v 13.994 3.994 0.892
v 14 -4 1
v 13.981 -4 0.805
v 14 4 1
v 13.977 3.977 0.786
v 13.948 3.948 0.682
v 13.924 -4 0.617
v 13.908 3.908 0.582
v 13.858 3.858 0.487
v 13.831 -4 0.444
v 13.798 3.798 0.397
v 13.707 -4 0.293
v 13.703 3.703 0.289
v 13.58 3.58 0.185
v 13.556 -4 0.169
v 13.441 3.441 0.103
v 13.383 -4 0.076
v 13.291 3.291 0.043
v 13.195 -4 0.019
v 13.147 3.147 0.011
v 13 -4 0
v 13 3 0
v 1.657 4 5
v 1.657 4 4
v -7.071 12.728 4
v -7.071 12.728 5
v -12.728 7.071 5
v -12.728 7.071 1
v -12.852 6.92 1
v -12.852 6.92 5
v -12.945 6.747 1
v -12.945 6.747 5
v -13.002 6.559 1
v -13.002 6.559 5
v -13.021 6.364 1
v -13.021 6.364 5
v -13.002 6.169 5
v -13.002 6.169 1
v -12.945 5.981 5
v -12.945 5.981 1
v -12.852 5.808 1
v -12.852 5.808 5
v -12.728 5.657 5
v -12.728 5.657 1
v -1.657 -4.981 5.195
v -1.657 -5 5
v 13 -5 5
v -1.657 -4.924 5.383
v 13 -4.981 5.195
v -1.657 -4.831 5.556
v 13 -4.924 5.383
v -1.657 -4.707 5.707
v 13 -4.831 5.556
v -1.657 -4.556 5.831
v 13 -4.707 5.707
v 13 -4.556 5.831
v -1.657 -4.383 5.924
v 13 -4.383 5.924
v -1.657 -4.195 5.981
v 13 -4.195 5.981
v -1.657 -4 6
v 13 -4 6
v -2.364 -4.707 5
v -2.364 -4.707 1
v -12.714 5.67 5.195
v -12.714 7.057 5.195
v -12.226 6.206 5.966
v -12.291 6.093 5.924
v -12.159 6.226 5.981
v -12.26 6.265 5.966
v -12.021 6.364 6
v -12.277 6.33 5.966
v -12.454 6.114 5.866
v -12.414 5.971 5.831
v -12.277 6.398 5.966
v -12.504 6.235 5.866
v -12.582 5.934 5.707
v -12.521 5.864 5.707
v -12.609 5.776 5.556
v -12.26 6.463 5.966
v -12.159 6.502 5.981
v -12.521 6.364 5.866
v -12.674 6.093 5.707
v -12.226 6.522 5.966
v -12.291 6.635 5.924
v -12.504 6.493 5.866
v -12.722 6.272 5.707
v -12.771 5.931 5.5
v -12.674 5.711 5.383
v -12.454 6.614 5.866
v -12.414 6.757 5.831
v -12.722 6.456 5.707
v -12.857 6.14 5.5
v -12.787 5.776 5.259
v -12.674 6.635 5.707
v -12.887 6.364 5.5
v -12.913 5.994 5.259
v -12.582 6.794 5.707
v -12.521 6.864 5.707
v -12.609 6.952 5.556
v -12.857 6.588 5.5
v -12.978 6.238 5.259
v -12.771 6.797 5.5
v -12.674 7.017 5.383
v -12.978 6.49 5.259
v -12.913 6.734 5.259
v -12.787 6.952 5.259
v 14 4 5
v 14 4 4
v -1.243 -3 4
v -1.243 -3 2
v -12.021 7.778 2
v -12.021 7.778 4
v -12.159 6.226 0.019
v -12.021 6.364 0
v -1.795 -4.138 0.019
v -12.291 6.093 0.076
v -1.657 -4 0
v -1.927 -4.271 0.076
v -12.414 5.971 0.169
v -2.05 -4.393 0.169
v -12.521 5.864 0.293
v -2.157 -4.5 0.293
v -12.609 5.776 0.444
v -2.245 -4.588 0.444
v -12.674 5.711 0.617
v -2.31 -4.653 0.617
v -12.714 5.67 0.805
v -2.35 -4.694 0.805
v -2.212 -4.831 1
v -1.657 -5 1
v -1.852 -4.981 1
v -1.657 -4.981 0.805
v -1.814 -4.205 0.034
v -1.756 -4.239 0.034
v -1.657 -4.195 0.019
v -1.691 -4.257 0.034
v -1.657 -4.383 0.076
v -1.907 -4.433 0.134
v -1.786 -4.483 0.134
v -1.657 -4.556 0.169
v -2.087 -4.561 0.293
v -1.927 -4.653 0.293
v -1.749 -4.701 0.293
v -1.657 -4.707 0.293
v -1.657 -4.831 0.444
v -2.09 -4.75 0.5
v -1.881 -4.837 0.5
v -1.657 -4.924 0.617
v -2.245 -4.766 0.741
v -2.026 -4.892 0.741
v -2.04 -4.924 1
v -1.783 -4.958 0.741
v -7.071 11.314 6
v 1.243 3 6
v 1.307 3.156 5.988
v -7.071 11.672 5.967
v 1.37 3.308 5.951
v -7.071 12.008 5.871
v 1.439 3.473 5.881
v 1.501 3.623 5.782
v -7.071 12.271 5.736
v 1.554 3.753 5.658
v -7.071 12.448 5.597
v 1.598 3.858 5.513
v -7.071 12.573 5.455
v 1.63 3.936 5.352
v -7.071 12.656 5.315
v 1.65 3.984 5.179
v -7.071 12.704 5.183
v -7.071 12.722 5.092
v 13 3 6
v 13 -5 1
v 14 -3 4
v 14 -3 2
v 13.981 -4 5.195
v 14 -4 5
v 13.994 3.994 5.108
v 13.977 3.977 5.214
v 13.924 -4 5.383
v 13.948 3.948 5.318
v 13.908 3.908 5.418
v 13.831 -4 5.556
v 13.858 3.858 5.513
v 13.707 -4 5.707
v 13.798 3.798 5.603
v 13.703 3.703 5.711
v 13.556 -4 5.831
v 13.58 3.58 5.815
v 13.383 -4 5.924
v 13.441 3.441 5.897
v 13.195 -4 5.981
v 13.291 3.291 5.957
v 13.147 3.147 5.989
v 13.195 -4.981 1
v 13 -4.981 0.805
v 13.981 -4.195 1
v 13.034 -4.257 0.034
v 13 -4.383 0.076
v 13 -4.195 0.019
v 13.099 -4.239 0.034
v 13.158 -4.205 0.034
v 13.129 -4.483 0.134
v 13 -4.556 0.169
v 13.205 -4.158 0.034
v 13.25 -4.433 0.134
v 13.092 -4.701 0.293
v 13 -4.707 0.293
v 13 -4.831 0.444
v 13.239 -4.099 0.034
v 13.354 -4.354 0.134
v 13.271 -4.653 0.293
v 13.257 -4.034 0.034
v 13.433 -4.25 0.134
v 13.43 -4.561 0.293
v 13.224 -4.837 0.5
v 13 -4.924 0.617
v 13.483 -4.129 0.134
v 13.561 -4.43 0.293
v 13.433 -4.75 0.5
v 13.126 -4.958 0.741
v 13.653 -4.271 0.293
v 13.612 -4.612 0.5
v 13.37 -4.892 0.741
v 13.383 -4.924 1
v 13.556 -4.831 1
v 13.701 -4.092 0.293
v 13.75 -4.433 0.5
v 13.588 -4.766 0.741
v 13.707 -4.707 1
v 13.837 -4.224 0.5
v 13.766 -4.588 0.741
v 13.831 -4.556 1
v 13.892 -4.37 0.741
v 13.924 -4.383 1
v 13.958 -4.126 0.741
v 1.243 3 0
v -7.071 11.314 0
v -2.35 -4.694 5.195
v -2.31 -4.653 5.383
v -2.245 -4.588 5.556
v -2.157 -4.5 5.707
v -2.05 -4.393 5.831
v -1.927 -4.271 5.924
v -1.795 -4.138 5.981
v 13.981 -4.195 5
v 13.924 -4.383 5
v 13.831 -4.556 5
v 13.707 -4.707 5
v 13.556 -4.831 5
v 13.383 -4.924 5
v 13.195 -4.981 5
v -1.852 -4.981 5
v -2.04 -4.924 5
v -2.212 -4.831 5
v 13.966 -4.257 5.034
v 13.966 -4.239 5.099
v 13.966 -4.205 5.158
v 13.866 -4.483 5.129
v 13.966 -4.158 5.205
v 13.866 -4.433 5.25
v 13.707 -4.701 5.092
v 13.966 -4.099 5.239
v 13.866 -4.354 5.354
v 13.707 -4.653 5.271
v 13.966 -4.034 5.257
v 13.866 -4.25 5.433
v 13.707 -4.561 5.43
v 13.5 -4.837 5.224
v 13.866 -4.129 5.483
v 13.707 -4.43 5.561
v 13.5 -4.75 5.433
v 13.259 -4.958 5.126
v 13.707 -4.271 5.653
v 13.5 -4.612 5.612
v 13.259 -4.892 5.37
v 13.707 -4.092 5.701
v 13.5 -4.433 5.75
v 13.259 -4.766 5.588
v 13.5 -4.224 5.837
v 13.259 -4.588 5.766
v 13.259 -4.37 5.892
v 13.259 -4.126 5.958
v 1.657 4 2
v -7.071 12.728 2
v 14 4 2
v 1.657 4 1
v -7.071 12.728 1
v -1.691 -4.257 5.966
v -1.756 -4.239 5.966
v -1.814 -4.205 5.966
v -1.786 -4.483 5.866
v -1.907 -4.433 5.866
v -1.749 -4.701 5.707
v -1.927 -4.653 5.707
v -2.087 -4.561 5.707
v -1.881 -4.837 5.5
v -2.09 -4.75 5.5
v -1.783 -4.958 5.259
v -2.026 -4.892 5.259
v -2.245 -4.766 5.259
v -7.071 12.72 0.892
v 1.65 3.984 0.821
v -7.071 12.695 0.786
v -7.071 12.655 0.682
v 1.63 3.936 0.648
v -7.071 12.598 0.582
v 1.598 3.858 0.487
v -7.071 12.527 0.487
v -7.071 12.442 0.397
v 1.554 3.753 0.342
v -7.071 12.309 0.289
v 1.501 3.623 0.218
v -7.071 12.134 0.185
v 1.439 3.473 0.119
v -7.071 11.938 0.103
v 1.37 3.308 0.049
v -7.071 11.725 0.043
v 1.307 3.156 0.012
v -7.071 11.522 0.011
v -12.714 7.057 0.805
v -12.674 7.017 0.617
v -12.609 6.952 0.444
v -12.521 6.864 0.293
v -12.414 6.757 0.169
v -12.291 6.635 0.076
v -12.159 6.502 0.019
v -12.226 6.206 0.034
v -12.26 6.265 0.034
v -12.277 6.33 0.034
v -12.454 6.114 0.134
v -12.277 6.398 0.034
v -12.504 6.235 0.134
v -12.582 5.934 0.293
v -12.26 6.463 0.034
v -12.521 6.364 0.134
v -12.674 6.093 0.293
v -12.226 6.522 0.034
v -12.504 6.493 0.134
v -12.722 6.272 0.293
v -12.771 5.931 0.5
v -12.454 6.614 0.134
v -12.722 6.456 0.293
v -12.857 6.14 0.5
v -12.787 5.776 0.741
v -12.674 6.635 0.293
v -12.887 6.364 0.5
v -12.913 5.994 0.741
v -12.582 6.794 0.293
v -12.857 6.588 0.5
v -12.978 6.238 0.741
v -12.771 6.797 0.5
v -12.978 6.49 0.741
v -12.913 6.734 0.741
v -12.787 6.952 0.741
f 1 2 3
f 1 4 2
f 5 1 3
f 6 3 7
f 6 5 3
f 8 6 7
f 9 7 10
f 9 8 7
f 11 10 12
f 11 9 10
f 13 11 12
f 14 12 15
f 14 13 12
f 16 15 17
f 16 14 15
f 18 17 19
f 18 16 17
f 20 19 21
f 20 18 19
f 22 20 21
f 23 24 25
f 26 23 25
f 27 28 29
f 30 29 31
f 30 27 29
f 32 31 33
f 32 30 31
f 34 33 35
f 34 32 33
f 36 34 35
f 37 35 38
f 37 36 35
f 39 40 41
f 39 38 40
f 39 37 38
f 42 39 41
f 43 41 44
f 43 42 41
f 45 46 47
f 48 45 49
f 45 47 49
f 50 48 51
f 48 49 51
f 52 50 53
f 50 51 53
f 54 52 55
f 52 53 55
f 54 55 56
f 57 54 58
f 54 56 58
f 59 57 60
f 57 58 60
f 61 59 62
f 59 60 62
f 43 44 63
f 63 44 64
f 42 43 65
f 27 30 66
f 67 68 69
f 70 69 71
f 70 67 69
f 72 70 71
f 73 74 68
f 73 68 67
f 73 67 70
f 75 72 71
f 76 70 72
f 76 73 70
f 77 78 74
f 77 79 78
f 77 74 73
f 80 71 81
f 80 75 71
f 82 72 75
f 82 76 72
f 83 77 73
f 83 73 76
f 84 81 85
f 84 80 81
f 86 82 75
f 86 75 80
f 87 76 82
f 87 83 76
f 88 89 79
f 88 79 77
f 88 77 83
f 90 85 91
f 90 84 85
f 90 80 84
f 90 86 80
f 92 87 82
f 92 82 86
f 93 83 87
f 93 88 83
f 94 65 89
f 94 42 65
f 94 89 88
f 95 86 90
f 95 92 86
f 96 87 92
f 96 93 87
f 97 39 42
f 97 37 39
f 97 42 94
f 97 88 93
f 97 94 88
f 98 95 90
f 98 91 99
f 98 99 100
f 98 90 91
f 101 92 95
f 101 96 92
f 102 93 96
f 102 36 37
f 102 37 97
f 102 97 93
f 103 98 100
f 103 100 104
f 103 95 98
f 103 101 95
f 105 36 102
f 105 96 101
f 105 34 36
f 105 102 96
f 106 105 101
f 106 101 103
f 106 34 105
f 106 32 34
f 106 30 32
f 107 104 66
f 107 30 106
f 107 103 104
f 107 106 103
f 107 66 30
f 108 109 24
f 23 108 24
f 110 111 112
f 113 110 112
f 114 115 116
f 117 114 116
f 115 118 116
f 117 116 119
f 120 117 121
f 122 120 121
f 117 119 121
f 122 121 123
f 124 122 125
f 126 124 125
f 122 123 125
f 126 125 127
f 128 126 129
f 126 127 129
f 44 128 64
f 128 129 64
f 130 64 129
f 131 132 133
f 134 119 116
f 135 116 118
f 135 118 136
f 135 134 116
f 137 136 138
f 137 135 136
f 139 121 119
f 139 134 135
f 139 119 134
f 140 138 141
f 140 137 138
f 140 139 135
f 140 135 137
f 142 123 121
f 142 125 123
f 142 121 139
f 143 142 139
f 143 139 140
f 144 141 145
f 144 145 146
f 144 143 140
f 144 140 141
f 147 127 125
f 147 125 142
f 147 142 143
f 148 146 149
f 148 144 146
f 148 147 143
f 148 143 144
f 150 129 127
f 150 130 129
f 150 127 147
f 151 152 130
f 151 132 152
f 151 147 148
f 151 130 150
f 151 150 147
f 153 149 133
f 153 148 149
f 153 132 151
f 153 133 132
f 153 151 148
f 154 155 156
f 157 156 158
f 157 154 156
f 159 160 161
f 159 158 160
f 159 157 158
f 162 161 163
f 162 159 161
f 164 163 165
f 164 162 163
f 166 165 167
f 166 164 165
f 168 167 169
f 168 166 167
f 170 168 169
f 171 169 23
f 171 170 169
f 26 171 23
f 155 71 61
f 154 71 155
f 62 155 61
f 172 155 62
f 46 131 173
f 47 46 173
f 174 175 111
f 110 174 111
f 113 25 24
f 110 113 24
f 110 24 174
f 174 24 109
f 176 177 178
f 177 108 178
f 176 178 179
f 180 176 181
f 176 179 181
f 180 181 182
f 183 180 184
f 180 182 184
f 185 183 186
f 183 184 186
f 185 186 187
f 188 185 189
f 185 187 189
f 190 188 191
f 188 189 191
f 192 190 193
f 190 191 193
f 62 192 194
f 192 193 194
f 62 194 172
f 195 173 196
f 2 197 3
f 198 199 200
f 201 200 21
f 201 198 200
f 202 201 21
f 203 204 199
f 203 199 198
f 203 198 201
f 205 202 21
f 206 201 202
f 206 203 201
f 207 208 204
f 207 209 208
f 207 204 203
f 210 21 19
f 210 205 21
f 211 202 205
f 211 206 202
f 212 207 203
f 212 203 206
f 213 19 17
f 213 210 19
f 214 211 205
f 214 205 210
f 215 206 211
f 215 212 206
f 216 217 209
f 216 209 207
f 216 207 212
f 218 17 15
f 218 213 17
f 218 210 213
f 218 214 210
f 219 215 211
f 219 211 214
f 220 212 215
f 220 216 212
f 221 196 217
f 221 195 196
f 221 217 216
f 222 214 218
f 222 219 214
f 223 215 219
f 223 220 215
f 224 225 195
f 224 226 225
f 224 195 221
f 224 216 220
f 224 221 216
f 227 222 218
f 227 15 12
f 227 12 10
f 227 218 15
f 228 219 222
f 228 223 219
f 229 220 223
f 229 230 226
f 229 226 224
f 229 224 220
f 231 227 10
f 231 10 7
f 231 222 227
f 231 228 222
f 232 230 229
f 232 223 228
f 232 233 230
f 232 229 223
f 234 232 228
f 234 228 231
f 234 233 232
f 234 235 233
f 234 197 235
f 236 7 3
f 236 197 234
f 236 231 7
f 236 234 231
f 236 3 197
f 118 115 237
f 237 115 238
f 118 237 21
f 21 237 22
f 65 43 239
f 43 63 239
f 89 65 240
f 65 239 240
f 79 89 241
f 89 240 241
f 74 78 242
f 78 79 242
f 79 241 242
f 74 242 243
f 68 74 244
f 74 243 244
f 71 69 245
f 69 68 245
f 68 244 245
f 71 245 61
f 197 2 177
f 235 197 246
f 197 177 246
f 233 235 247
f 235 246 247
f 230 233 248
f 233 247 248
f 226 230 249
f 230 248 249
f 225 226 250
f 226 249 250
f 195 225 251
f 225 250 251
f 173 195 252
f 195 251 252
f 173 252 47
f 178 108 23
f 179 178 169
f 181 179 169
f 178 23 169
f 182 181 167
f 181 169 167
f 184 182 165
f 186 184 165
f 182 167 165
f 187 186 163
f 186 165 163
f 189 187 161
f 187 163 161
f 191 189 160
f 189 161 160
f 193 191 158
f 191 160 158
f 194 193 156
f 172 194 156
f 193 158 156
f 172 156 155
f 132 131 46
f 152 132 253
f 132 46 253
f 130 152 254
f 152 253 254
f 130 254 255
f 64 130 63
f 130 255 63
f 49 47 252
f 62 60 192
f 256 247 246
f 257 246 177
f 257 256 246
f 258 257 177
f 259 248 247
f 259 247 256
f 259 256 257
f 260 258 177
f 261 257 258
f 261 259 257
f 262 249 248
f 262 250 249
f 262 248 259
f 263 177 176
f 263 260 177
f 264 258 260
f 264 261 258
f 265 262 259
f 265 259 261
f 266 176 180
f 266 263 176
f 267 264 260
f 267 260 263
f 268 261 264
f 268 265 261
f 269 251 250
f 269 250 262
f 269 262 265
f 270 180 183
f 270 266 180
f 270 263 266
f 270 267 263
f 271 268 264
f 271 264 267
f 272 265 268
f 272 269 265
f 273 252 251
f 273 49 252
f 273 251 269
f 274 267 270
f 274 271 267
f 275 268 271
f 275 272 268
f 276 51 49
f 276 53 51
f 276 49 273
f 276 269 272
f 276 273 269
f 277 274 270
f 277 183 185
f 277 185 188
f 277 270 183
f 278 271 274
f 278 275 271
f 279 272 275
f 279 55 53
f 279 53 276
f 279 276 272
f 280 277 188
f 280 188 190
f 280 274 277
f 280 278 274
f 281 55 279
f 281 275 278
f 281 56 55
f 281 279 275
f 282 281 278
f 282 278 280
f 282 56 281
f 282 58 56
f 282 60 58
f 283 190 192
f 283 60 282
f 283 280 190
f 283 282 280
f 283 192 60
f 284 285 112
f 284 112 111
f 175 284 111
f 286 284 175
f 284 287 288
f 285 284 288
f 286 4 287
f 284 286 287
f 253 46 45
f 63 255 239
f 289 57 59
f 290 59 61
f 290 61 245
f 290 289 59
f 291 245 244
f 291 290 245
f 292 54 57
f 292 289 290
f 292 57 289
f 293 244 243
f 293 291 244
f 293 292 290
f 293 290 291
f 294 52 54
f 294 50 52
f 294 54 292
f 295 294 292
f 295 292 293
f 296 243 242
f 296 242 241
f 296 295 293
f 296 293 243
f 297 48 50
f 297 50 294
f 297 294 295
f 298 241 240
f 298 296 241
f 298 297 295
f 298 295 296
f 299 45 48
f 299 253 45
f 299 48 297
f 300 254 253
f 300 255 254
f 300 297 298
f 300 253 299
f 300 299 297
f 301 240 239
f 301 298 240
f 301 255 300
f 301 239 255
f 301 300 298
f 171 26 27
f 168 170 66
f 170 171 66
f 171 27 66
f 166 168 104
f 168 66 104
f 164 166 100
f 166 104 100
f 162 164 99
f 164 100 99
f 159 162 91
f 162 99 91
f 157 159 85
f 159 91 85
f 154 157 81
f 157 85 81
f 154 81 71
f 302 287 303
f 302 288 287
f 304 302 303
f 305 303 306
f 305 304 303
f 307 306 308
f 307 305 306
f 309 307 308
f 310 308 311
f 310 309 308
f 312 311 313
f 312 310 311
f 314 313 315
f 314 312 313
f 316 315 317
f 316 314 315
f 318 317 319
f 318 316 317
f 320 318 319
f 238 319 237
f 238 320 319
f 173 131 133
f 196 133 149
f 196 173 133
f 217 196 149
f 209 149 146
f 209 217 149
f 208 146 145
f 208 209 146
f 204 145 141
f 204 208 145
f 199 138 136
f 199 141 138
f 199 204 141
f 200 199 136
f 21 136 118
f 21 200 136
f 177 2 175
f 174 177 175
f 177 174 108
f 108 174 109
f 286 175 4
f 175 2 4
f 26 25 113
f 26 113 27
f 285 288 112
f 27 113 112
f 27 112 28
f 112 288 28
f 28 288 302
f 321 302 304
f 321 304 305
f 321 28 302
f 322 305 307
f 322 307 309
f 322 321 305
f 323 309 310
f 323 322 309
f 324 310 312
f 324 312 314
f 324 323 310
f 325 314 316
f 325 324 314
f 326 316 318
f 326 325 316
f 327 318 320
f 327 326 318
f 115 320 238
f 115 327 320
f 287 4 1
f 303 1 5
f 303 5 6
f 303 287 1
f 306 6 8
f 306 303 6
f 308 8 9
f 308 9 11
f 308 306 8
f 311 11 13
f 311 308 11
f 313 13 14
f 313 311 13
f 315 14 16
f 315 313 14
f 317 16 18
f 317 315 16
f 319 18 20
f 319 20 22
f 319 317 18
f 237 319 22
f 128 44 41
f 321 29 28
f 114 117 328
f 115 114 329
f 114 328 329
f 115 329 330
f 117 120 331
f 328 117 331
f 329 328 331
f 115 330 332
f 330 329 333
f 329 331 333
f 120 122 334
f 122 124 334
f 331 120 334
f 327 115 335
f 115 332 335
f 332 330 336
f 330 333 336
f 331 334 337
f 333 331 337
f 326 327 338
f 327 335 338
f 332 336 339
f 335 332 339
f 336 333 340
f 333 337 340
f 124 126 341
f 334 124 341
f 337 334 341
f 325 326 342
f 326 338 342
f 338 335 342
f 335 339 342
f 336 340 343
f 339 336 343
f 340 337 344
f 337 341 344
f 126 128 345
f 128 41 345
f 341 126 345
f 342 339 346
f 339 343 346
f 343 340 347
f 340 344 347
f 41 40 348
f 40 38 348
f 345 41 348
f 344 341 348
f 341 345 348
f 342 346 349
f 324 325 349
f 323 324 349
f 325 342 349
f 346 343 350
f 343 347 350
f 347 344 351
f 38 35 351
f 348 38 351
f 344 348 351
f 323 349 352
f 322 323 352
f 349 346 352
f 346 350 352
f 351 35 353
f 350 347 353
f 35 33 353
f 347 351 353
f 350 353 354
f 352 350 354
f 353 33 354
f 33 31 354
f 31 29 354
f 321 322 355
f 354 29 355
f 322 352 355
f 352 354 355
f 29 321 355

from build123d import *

# Parameters (mm, degrees)
F1_DEPTH = 2
F3_DEPTH = 2
F5_DEPTH = 2
F6_R     = 1


with BuildPart() as f1:
    # F0 (on Top) → F1 (new body)
    with BuildSketch(Plane.XY):
        Polygon((-13.435029, 6.363961), (-2.071068, -5), (14, -5), (14, 4), (1.656854, 4), (-7.071068, 12.727922), align=None)
    extrude(amount=F1_DEPTH)

    # F2 (on face) → F3 (join)
    with BuildSketch(Plane.XY.offset(2)):
        Polygon((-12.020815, 7.778175), (-13.435029, 6.363961), (-2.071068, -5), (14, -5), (14, -3), (-1.242641, -3), align=None)
    extrude(amount=F3_DEPTH)

    # F4 (on face) → F5 (join)
    with BuildSketch(Plane.XY.offset(4)):
        Polygon((-7.071068, 12.727922), (-12.020815, 7.778175), (-13.435029, 6.363961), (-2.071068, -5), (14, -5), (14, -3), (14, 4), (1.656854, 4), align=None)
    extrude(amount=F5_DEPTH)

    # F6
    f6_edges = [f1.edges().sort_by_distance(p)[0] for p in [
        (-13.435029, 6.363961, 3),
        (-7.753048, 0.681981, 6),
        (-2.071068, -5, 3),
        (-7.753048, 0.681981, 0),
        (5.964466, -5, 6),
        (14, -5, 3),
        (5.964466, -5, 0),
        (-10.253048, 9.545942, 0),
        (14, -0.5, 0),
        (7.828427, 4, 0),
        (-2.707107, 8.363961, 0),
        (14, -0.5, 6),
        (7.828427, 4, 6),
        (-2.707107, 8.363961, 6),
        (-10.253048, 9.545942, 6),
    ]]
    fillet(f6_edges, radius=F6_R)


solid = f1.part
